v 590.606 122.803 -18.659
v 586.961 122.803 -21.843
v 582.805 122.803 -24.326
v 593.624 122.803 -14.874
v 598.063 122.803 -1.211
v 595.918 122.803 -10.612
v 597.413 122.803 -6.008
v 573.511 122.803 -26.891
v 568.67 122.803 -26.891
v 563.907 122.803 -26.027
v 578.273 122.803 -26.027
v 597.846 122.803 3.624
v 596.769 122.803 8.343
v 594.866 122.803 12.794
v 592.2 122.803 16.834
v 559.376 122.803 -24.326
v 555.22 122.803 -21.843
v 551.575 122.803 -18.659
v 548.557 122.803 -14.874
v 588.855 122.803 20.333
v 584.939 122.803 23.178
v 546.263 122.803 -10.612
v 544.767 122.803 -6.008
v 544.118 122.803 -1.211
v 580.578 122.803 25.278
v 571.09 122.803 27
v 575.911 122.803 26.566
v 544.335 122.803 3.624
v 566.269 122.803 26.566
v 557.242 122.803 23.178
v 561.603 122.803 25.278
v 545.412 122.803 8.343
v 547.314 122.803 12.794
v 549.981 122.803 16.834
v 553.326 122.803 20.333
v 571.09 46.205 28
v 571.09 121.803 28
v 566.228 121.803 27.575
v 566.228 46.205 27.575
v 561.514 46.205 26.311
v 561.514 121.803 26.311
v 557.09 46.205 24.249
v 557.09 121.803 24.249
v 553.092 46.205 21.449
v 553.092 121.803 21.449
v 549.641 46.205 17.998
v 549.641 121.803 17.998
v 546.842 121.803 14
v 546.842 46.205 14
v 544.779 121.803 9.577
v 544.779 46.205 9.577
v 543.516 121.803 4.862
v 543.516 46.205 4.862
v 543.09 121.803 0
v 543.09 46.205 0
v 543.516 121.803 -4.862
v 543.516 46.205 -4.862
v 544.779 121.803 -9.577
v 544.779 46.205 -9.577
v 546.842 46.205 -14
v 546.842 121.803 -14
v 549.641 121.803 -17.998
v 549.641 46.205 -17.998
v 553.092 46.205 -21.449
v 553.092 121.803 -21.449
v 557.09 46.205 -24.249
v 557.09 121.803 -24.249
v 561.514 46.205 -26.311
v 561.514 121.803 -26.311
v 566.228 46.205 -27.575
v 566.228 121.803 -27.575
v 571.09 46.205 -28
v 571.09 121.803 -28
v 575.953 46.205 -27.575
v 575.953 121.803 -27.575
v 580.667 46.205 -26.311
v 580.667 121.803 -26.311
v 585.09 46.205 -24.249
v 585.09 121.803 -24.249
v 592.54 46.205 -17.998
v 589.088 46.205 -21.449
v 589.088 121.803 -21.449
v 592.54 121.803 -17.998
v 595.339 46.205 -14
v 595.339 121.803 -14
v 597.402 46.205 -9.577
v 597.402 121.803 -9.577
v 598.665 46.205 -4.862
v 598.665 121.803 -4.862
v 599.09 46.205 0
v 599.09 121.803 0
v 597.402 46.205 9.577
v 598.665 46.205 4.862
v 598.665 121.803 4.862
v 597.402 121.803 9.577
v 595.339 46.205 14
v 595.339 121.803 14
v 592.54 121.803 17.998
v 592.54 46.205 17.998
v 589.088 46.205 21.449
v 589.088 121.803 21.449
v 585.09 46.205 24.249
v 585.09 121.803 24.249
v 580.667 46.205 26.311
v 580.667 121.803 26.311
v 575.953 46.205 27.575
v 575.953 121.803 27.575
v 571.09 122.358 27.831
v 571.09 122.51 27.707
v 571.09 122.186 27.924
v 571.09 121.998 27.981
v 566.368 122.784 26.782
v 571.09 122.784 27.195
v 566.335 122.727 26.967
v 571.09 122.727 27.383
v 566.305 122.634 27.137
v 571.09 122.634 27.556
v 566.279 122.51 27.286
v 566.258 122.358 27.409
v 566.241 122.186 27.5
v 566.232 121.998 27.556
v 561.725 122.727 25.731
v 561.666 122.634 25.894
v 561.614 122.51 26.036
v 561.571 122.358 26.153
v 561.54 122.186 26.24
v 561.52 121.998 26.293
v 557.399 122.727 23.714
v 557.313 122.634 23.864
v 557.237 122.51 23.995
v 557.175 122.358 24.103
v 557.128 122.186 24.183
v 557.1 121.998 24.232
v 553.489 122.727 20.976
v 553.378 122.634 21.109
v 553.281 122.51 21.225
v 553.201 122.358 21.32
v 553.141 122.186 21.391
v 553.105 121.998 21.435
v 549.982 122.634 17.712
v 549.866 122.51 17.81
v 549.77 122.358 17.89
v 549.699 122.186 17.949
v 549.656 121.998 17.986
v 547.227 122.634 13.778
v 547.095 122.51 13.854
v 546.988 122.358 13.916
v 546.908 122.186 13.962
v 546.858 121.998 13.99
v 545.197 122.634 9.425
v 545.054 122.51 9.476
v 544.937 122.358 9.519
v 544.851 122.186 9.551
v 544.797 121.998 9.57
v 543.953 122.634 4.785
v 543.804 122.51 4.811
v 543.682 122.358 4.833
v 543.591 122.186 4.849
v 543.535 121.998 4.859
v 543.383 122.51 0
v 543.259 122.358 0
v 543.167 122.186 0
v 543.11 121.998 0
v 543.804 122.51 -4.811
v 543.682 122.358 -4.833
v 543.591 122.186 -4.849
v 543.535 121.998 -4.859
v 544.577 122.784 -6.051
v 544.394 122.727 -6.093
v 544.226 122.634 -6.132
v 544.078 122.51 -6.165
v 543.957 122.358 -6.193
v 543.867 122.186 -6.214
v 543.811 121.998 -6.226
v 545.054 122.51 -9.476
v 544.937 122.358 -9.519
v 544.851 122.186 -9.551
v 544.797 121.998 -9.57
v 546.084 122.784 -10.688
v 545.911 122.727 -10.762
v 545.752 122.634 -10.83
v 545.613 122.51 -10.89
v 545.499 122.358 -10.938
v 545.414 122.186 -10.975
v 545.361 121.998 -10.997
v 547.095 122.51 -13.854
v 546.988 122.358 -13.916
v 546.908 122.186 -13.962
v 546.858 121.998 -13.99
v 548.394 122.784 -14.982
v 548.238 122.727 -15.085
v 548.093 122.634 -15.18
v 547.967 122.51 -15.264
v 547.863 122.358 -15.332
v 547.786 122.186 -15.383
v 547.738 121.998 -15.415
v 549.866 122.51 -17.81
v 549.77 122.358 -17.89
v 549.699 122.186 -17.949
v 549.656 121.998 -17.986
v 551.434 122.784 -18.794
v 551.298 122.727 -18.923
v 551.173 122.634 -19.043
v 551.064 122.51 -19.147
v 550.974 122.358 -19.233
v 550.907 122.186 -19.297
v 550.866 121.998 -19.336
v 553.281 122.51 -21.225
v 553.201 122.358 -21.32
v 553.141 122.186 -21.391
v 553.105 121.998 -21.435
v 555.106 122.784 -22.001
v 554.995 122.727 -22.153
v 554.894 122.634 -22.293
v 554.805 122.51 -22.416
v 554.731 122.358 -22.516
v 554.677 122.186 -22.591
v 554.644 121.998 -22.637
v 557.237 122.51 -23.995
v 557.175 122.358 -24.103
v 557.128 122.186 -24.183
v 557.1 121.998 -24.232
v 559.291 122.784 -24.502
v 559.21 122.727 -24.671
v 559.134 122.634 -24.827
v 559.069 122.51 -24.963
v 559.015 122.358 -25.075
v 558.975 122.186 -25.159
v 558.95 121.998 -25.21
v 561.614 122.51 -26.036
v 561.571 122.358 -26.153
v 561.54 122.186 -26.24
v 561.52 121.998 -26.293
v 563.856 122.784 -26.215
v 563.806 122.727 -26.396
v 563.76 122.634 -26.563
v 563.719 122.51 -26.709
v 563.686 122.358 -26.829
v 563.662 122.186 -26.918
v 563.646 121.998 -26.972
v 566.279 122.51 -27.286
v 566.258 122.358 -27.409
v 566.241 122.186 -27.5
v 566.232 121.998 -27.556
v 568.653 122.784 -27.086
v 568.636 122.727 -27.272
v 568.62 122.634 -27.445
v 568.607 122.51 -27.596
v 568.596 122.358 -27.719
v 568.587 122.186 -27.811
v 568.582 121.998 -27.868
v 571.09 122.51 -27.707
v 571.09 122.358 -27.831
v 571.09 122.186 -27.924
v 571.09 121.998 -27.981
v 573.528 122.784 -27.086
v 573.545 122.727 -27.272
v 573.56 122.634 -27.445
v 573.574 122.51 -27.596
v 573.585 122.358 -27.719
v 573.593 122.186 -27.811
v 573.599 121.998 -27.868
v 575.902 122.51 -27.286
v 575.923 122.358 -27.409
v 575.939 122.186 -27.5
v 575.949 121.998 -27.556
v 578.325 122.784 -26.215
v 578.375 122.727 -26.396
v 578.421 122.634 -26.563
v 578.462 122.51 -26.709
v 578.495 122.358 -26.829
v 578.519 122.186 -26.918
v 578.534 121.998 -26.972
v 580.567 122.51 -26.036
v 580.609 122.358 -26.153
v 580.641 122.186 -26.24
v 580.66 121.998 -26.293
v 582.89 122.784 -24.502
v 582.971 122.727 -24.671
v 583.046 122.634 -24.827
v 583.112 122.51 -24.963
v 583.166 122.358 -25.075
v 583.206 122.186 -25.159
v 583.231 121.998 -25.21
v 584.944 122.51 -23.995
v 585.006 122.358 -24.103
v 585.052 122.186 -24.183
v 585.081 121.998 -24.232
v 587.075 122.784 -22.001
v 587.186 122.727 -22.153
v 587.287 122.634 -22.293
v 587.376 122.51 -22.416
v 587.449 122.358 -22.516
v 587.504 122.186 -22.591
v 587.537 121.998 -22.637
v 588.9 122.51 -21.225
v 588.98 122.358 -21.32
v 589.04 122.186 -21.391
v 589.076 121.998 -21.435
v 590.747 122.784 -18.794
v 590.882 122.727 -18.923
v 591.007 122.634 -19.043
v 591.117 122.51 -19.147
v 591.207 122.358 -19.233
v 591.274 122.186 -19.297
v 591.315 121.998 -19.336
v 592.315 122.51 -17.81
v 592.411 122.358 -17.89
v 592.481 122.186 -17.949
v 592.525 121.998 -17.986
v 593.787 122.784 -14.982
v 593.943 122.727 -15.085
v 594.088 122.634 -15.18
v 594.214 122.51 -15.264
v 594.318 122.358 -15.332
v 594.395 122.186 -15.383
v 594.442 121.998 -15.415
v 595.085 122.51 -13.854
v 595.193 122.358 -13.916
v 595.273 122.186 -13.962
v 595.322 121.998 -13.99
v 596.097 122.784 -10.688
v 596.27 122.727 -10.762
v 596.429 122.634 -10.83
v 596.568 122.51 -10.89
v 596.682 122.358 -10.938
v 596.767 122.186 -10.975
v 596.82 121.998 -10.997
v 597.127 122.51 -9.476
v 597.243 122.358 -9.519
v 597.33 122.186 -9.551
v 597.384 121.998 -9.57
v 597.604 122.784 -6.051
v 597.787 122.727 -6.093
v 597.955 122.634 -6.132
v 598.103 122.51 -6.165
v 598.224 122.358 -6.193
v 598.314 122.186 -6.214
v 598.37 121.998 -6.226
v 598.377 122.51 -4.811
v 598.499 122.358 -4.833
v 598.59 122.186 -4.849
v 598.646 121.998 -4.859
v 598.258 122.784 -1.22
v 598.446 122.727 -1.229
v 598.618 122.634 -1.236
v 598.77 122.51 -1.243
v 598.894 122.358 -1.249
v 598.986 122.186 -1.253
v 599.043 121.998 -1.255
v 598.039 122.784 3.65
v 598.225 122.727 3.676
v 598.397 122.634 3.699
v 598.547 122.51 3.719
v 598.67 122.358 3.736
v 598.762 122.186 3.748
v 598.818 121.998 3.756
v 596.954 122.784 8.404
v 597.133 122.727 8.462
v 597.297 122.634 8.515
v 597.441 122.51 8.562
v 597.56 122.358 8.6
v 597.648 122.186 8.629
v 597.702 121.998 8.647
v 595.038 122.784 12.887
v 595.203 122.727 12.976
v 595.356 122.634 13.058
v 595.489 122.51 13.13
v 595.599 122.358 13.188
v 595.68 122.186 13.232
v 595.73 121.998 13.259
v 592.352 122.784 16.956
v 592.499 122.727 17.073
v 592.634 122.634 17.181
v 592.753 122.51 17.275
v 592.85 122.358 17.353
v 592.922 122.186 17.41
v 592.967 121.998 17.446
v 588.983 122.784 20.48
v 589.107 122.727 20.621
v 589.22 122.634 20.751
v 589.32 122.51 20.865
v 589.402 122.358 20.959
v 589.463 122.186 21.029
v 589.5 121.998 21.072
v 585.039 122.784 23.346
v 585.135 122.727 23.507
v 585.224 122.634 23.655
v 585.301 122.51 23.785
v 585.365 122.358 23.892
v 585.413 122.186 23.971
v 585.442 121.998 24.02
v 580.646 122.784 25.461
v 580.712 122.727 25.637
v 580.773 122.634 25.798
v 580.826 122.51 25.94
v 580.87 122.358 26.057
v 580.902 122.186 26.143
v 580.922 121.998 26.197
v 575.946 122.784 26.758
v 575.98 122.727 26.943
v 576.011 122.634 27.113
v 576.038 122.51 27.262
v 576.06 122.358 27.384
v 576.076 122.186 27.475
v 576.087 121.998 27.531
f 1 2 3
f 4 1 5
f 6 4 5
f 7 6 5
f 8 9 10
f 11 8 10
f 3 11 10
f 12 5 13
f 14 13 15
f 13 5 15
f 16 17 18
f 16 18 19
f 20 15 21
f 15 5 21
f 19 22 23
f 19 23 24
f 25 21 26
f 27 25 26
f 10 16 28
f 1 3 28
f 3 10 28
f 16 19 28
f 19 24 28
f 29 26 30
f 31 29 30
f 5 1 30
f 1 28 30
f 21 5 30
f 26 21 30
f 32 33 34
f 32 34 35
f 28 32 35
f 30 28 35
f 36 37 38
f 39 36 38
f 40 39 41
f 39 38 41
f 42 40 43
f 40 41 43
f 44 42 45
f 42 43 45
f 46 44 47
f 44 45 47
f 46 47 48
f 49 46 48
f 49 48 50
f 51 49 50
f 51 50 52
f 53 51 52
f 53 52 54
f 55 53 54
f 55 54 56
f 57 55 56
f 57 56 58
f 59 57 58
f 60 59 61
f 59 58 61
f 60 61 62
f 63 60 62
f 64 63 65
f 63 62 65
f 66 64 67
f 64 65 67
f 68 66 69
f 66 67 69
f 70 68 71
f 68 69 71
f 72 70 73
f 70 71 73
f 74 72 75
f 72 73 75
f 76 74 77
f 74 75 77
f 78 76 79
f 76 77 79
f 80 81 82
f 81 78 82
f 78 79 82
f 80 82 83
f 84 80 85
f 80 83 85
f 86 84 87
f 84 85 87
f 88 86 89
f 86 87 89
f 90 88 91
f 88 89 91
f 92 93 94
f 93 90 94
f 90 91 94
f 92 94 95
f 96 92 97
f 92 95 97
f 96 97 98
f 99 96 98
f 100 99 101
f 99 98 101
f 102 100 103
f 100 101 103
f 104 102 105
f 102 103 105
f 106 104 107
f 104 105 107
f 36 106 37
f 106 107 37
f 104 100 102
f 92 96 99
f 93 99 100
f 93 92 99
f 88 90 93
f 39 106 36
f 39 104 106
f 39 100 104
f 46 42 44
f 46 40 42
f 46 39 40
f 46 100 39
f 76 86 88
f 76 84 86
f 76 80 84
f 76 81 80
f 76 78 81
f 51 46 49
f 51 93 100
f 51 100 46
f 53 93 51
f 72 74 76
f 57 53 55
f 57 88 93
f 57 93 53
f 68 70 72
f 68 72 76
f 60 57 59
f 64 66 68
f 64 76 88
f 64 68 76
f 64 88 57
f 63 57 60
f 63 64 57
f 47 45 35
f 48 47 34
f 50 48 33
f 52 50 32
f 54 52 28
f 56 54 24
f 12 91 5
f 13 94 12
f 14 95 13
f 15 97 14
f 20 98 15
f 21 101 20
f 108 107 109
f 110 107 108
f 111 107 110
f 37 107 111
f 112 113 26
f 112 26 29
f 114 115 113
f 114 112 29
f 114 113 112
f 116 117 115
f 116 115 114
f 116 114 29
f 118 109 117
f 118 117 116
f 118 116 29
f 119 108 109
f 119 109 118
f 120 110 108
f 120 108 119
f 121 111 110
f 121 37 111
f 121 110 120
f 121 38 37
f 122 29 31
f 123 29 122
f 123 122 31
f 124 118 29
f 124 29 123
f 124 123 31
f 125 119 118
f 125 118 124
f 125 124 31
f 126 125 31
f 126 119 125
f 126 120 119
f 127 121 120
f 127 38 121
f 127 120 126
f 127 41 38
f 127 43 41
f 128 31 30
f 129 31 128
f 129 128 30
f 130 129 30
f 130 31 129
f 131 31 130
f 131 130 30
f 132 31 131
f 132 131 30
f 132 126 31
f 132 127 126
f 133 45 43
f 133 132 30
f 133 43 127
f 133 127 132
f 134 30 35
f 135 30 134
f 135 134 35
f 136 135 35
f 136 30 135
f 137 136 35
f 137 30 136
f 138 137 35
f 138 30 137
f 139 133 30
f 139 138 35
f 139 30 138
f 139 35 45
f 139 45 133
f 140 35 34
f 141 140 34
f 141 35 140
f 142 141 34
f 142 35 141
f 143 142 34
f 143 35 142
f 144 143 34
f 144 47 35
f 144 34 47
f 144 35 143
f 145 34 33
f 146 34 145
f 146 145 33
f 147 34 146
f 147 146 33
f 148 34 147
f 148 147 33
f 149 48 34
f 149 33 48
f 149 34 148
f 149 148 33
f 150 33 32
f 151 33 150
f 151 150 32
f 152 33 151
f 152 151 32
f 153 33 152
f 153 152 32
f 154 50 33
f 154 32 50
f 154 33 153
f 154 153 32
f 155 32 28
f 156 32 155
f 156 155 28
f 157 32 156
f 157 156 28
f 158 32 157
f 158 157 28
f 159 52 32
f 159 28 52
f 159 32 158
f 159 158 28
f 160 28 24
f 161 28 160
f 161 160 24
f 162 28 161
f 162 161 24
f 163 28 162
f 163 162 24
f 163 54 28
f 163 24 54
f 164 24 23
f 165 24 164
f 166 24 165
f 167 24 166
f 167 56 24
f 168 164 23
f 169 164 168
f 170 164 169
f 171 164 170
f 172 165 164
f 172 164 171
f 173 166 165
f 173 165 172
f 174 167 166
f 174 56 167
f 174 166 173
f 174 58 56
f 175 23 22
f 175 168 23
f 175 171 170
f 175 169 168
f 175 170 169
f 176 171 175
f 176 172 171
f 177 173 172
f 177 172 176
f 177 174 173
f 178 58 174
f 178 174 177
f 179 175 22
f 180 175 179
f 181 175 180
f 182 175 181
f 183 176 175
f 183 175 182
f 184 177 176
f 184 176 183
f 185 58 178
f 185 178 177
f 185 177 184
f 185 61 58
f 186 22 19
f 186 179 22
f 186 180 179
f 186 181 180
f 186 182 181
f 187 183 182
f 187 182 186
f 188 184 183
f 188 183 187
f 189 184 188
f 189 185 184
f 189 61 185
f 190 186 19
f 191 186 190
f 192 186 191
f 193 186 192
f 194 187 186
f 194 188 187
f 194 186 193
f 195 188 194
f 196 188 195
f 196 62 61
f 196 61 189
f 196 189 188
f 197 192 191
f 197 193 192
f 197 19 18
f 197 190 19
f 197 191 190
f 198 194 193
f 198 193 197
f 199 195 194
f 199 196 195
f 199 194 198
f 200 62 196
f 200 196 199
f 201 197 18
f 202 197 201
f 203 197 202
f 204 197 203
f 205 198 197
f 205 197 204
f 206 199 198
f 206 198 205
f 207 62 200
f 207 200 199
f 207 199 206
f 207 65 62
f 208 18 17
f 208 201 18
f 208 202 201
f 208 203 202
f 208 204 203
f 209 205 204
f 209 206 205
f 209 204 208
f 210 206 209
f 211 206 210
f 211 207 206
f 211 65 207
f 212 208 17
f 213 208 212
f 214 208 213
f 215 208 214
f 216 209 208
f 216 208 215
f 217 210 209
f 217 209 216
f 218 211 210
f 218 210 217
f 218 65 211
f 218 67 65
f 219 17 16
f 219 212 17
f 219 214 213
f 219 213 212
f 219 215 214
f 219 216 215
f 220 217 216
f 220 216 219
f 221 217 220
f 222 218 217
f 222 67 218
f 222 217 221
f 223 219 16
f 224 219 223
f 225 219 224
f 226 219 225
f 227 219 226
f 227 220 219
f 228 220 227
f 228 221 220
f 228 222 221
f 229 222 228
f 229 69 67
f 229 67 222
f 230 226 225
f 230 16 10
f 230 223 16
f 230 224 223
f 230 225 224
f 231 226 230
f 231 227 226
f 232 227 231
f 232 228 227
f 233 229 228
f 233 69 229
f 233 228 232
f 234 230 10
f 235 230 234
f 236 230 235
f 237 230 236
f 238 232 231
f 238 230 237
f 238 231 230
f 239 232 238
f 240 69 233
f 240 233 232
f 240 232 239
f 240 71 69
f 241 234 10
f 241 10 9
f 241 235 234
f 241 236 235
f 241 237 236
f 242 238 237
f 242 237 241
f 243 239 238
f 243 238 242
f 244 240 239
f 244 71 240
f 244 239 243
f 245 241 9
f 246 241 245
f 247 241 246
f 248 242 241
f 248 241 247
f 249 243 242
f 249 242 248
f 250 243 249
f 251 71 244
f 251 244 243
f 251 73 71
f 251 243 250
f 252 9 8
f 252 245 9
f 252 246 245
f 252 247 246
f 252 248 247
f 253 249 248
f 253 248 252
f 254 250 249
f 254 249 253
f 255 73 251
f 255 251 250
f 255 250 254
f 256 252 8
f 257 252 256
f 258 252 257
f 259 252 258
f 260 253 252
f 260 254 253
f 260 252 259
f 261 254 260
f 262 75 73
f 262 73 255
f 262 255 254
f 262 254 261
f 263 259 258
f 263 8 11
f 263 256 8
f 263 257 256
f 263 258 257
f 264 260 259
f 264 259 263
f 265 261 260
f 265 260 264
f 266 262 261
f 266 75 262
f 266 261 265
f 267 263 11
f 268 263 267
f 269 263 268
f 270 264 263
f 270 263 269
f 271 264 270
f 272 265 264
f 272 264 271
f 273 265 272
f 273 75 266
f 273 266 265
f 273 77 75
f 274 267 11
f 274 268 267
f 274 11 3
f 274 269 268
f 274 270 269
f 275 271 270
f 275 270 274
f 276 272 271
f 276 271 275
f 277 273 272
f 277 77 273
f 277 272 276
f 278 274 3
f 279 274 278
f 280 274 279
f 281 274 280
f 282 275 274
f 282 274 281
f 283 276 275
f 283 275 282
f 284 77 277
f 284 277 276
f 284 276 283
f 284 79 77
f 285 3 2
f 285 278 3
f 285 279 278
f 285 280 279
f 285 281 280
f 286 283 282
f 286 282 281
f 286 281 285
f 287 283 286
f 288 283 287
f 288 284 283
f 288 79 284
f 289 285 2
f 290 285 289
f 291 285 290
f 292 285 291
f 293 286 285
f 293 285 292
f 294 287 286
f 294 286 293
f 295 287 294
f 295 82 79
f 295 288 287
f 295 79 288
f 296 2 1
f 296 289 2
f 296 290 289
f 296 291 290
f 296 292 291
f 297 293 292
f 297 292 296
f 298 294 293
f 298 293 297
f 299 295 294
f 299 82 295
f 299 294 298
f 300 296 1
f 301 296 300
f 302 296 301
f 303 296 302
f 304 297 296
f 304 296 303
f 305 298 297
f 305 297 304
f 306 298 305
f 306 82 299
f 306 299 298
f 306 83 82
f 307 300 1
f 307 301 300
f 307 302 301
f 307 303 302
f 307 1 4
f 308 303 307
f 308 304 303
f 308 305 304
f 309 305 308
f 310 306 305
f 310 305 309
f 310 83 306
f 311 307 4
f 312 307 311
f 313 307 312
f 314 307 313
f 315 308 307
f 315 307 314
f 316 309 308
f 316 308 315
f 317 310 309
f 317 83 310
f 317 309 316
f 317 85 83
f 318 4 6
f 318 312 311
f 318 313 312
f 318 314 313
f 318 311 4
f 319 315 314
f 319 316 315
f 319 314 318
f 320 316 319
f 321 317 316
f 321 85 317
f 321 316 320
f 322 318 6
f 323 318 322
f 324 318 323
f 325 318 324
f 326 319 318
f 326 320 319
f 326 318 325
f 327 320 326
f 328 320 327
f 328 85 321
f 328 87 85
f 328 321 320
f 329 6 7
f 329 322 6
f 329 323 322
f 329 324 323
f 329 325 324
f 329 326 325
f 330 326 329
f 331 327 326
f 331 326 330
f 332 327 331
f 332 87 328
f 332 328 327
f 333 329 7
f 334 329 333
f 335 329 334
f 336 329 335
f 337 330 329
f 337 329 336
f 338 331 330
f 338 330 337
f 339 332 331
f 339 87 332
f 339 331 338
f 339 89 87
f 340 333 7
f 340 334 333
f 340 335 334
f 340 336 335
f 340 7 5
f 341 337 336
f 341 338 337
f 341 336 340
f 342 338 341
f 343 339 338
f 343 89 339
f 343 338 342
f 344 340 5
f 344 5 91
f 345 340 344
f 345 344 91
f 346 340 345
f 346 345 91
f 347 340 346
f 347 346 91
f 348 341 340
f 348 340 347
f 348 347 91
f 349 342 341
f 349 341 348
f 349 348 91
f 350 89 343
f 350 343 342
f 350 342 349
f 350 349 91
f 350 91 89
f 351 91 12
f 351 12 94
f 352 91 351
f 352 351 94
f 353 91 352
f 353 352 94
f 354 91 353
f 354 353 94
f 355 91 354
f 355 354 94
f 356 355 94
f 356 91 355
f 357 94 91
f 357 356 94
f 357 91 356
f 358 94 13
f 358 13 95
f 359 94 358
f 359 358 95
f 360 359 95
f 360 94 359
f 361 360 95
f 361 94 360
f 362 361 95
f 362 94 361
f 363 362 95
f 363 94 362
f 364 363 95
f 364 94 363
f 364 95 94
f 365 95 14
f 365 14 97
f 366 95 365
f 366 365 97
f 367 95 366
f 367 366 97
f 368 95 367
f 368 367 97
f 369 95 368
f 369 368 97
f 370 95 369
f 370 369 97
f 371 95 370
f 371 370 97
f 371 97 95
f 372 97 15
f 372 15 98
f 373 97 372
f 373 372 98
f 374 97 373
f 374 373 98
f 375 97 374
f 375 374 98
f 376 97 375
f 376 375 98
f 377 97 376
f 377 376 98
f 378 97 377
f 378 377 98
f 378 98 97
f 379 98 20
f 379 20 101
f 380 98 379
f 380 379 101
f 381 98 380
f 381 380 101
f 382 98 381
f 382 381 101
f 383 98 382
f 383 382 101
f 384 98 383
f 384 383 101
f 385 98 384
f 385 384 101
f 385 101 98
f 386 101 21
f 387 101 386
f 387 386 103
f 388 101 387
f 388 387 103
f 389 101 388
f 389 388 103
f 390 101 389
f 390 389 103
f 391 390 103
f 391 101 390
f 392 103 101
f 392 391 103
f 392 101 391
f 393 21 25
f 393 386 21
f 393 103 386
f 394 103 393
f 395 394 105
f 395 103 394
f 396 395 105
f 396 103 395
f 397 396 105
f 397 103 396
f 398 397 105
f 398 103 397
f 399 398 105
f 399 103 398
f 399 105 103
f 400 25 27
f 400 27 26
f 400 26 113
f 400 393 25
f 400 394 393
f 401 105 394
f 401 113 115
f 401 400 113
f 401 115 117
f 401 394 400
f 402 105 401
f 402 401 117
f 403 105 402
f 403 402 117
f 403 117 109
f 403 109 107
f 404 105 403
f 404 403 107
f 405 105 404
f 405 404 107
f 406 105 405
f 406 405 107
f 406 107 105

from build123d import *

# Parameters (mm, degrees)
SKETCH2_R          = 29.716008705
CUT_EXTRUDE1_DEPTH = 3
FILLET1_R          = 1


with BuildPart() as part:
    # Sketch1 → Revolve1 (revolve)
    with BuildSketch(Plane.XY, mode=Mode.PRIVATE) as revolve1_sk:
        Polygon((543.090410183, 122.80292457), (571.090410183, 122.80292457), (571.090410183, 43.204678726), (552.249882464, 43.204678726), (546.251643979, 44.096308771), (543.090410183, 45.879568862), align=None)
    revolve(revolve1_sk.sketch.rotate(Axis((571.090410183, 122.80292457, 0), (0, -1, 0)), 270), axis=Axis((571.090410183, 122.80292457, 0), (0, -1, 0)))

    # Sketch2 → Cut-Extrude1 (cut)
    with BuildSketch(Plane(origin=(0, 43.204678726, 0), x_dir=(-1, 0, 0), z_dir=(0, -1, 0))):
        with Locations((-571.090410183, 0)):
            Circle(SKETCH2_R)
    extrude(amount=-CUT_EXTRUDE1_DEPTH, mode=Mode.SUBTRACT)

    # Fillet1
    fillet1_edges = [part.edges().sort_by_distance(p)[0] for p in [
        (571.090410183, 122.80292457, -28),
    ]]
    fillet(fillet1_edges, radius=FILLET1_R)


solid = part.part
